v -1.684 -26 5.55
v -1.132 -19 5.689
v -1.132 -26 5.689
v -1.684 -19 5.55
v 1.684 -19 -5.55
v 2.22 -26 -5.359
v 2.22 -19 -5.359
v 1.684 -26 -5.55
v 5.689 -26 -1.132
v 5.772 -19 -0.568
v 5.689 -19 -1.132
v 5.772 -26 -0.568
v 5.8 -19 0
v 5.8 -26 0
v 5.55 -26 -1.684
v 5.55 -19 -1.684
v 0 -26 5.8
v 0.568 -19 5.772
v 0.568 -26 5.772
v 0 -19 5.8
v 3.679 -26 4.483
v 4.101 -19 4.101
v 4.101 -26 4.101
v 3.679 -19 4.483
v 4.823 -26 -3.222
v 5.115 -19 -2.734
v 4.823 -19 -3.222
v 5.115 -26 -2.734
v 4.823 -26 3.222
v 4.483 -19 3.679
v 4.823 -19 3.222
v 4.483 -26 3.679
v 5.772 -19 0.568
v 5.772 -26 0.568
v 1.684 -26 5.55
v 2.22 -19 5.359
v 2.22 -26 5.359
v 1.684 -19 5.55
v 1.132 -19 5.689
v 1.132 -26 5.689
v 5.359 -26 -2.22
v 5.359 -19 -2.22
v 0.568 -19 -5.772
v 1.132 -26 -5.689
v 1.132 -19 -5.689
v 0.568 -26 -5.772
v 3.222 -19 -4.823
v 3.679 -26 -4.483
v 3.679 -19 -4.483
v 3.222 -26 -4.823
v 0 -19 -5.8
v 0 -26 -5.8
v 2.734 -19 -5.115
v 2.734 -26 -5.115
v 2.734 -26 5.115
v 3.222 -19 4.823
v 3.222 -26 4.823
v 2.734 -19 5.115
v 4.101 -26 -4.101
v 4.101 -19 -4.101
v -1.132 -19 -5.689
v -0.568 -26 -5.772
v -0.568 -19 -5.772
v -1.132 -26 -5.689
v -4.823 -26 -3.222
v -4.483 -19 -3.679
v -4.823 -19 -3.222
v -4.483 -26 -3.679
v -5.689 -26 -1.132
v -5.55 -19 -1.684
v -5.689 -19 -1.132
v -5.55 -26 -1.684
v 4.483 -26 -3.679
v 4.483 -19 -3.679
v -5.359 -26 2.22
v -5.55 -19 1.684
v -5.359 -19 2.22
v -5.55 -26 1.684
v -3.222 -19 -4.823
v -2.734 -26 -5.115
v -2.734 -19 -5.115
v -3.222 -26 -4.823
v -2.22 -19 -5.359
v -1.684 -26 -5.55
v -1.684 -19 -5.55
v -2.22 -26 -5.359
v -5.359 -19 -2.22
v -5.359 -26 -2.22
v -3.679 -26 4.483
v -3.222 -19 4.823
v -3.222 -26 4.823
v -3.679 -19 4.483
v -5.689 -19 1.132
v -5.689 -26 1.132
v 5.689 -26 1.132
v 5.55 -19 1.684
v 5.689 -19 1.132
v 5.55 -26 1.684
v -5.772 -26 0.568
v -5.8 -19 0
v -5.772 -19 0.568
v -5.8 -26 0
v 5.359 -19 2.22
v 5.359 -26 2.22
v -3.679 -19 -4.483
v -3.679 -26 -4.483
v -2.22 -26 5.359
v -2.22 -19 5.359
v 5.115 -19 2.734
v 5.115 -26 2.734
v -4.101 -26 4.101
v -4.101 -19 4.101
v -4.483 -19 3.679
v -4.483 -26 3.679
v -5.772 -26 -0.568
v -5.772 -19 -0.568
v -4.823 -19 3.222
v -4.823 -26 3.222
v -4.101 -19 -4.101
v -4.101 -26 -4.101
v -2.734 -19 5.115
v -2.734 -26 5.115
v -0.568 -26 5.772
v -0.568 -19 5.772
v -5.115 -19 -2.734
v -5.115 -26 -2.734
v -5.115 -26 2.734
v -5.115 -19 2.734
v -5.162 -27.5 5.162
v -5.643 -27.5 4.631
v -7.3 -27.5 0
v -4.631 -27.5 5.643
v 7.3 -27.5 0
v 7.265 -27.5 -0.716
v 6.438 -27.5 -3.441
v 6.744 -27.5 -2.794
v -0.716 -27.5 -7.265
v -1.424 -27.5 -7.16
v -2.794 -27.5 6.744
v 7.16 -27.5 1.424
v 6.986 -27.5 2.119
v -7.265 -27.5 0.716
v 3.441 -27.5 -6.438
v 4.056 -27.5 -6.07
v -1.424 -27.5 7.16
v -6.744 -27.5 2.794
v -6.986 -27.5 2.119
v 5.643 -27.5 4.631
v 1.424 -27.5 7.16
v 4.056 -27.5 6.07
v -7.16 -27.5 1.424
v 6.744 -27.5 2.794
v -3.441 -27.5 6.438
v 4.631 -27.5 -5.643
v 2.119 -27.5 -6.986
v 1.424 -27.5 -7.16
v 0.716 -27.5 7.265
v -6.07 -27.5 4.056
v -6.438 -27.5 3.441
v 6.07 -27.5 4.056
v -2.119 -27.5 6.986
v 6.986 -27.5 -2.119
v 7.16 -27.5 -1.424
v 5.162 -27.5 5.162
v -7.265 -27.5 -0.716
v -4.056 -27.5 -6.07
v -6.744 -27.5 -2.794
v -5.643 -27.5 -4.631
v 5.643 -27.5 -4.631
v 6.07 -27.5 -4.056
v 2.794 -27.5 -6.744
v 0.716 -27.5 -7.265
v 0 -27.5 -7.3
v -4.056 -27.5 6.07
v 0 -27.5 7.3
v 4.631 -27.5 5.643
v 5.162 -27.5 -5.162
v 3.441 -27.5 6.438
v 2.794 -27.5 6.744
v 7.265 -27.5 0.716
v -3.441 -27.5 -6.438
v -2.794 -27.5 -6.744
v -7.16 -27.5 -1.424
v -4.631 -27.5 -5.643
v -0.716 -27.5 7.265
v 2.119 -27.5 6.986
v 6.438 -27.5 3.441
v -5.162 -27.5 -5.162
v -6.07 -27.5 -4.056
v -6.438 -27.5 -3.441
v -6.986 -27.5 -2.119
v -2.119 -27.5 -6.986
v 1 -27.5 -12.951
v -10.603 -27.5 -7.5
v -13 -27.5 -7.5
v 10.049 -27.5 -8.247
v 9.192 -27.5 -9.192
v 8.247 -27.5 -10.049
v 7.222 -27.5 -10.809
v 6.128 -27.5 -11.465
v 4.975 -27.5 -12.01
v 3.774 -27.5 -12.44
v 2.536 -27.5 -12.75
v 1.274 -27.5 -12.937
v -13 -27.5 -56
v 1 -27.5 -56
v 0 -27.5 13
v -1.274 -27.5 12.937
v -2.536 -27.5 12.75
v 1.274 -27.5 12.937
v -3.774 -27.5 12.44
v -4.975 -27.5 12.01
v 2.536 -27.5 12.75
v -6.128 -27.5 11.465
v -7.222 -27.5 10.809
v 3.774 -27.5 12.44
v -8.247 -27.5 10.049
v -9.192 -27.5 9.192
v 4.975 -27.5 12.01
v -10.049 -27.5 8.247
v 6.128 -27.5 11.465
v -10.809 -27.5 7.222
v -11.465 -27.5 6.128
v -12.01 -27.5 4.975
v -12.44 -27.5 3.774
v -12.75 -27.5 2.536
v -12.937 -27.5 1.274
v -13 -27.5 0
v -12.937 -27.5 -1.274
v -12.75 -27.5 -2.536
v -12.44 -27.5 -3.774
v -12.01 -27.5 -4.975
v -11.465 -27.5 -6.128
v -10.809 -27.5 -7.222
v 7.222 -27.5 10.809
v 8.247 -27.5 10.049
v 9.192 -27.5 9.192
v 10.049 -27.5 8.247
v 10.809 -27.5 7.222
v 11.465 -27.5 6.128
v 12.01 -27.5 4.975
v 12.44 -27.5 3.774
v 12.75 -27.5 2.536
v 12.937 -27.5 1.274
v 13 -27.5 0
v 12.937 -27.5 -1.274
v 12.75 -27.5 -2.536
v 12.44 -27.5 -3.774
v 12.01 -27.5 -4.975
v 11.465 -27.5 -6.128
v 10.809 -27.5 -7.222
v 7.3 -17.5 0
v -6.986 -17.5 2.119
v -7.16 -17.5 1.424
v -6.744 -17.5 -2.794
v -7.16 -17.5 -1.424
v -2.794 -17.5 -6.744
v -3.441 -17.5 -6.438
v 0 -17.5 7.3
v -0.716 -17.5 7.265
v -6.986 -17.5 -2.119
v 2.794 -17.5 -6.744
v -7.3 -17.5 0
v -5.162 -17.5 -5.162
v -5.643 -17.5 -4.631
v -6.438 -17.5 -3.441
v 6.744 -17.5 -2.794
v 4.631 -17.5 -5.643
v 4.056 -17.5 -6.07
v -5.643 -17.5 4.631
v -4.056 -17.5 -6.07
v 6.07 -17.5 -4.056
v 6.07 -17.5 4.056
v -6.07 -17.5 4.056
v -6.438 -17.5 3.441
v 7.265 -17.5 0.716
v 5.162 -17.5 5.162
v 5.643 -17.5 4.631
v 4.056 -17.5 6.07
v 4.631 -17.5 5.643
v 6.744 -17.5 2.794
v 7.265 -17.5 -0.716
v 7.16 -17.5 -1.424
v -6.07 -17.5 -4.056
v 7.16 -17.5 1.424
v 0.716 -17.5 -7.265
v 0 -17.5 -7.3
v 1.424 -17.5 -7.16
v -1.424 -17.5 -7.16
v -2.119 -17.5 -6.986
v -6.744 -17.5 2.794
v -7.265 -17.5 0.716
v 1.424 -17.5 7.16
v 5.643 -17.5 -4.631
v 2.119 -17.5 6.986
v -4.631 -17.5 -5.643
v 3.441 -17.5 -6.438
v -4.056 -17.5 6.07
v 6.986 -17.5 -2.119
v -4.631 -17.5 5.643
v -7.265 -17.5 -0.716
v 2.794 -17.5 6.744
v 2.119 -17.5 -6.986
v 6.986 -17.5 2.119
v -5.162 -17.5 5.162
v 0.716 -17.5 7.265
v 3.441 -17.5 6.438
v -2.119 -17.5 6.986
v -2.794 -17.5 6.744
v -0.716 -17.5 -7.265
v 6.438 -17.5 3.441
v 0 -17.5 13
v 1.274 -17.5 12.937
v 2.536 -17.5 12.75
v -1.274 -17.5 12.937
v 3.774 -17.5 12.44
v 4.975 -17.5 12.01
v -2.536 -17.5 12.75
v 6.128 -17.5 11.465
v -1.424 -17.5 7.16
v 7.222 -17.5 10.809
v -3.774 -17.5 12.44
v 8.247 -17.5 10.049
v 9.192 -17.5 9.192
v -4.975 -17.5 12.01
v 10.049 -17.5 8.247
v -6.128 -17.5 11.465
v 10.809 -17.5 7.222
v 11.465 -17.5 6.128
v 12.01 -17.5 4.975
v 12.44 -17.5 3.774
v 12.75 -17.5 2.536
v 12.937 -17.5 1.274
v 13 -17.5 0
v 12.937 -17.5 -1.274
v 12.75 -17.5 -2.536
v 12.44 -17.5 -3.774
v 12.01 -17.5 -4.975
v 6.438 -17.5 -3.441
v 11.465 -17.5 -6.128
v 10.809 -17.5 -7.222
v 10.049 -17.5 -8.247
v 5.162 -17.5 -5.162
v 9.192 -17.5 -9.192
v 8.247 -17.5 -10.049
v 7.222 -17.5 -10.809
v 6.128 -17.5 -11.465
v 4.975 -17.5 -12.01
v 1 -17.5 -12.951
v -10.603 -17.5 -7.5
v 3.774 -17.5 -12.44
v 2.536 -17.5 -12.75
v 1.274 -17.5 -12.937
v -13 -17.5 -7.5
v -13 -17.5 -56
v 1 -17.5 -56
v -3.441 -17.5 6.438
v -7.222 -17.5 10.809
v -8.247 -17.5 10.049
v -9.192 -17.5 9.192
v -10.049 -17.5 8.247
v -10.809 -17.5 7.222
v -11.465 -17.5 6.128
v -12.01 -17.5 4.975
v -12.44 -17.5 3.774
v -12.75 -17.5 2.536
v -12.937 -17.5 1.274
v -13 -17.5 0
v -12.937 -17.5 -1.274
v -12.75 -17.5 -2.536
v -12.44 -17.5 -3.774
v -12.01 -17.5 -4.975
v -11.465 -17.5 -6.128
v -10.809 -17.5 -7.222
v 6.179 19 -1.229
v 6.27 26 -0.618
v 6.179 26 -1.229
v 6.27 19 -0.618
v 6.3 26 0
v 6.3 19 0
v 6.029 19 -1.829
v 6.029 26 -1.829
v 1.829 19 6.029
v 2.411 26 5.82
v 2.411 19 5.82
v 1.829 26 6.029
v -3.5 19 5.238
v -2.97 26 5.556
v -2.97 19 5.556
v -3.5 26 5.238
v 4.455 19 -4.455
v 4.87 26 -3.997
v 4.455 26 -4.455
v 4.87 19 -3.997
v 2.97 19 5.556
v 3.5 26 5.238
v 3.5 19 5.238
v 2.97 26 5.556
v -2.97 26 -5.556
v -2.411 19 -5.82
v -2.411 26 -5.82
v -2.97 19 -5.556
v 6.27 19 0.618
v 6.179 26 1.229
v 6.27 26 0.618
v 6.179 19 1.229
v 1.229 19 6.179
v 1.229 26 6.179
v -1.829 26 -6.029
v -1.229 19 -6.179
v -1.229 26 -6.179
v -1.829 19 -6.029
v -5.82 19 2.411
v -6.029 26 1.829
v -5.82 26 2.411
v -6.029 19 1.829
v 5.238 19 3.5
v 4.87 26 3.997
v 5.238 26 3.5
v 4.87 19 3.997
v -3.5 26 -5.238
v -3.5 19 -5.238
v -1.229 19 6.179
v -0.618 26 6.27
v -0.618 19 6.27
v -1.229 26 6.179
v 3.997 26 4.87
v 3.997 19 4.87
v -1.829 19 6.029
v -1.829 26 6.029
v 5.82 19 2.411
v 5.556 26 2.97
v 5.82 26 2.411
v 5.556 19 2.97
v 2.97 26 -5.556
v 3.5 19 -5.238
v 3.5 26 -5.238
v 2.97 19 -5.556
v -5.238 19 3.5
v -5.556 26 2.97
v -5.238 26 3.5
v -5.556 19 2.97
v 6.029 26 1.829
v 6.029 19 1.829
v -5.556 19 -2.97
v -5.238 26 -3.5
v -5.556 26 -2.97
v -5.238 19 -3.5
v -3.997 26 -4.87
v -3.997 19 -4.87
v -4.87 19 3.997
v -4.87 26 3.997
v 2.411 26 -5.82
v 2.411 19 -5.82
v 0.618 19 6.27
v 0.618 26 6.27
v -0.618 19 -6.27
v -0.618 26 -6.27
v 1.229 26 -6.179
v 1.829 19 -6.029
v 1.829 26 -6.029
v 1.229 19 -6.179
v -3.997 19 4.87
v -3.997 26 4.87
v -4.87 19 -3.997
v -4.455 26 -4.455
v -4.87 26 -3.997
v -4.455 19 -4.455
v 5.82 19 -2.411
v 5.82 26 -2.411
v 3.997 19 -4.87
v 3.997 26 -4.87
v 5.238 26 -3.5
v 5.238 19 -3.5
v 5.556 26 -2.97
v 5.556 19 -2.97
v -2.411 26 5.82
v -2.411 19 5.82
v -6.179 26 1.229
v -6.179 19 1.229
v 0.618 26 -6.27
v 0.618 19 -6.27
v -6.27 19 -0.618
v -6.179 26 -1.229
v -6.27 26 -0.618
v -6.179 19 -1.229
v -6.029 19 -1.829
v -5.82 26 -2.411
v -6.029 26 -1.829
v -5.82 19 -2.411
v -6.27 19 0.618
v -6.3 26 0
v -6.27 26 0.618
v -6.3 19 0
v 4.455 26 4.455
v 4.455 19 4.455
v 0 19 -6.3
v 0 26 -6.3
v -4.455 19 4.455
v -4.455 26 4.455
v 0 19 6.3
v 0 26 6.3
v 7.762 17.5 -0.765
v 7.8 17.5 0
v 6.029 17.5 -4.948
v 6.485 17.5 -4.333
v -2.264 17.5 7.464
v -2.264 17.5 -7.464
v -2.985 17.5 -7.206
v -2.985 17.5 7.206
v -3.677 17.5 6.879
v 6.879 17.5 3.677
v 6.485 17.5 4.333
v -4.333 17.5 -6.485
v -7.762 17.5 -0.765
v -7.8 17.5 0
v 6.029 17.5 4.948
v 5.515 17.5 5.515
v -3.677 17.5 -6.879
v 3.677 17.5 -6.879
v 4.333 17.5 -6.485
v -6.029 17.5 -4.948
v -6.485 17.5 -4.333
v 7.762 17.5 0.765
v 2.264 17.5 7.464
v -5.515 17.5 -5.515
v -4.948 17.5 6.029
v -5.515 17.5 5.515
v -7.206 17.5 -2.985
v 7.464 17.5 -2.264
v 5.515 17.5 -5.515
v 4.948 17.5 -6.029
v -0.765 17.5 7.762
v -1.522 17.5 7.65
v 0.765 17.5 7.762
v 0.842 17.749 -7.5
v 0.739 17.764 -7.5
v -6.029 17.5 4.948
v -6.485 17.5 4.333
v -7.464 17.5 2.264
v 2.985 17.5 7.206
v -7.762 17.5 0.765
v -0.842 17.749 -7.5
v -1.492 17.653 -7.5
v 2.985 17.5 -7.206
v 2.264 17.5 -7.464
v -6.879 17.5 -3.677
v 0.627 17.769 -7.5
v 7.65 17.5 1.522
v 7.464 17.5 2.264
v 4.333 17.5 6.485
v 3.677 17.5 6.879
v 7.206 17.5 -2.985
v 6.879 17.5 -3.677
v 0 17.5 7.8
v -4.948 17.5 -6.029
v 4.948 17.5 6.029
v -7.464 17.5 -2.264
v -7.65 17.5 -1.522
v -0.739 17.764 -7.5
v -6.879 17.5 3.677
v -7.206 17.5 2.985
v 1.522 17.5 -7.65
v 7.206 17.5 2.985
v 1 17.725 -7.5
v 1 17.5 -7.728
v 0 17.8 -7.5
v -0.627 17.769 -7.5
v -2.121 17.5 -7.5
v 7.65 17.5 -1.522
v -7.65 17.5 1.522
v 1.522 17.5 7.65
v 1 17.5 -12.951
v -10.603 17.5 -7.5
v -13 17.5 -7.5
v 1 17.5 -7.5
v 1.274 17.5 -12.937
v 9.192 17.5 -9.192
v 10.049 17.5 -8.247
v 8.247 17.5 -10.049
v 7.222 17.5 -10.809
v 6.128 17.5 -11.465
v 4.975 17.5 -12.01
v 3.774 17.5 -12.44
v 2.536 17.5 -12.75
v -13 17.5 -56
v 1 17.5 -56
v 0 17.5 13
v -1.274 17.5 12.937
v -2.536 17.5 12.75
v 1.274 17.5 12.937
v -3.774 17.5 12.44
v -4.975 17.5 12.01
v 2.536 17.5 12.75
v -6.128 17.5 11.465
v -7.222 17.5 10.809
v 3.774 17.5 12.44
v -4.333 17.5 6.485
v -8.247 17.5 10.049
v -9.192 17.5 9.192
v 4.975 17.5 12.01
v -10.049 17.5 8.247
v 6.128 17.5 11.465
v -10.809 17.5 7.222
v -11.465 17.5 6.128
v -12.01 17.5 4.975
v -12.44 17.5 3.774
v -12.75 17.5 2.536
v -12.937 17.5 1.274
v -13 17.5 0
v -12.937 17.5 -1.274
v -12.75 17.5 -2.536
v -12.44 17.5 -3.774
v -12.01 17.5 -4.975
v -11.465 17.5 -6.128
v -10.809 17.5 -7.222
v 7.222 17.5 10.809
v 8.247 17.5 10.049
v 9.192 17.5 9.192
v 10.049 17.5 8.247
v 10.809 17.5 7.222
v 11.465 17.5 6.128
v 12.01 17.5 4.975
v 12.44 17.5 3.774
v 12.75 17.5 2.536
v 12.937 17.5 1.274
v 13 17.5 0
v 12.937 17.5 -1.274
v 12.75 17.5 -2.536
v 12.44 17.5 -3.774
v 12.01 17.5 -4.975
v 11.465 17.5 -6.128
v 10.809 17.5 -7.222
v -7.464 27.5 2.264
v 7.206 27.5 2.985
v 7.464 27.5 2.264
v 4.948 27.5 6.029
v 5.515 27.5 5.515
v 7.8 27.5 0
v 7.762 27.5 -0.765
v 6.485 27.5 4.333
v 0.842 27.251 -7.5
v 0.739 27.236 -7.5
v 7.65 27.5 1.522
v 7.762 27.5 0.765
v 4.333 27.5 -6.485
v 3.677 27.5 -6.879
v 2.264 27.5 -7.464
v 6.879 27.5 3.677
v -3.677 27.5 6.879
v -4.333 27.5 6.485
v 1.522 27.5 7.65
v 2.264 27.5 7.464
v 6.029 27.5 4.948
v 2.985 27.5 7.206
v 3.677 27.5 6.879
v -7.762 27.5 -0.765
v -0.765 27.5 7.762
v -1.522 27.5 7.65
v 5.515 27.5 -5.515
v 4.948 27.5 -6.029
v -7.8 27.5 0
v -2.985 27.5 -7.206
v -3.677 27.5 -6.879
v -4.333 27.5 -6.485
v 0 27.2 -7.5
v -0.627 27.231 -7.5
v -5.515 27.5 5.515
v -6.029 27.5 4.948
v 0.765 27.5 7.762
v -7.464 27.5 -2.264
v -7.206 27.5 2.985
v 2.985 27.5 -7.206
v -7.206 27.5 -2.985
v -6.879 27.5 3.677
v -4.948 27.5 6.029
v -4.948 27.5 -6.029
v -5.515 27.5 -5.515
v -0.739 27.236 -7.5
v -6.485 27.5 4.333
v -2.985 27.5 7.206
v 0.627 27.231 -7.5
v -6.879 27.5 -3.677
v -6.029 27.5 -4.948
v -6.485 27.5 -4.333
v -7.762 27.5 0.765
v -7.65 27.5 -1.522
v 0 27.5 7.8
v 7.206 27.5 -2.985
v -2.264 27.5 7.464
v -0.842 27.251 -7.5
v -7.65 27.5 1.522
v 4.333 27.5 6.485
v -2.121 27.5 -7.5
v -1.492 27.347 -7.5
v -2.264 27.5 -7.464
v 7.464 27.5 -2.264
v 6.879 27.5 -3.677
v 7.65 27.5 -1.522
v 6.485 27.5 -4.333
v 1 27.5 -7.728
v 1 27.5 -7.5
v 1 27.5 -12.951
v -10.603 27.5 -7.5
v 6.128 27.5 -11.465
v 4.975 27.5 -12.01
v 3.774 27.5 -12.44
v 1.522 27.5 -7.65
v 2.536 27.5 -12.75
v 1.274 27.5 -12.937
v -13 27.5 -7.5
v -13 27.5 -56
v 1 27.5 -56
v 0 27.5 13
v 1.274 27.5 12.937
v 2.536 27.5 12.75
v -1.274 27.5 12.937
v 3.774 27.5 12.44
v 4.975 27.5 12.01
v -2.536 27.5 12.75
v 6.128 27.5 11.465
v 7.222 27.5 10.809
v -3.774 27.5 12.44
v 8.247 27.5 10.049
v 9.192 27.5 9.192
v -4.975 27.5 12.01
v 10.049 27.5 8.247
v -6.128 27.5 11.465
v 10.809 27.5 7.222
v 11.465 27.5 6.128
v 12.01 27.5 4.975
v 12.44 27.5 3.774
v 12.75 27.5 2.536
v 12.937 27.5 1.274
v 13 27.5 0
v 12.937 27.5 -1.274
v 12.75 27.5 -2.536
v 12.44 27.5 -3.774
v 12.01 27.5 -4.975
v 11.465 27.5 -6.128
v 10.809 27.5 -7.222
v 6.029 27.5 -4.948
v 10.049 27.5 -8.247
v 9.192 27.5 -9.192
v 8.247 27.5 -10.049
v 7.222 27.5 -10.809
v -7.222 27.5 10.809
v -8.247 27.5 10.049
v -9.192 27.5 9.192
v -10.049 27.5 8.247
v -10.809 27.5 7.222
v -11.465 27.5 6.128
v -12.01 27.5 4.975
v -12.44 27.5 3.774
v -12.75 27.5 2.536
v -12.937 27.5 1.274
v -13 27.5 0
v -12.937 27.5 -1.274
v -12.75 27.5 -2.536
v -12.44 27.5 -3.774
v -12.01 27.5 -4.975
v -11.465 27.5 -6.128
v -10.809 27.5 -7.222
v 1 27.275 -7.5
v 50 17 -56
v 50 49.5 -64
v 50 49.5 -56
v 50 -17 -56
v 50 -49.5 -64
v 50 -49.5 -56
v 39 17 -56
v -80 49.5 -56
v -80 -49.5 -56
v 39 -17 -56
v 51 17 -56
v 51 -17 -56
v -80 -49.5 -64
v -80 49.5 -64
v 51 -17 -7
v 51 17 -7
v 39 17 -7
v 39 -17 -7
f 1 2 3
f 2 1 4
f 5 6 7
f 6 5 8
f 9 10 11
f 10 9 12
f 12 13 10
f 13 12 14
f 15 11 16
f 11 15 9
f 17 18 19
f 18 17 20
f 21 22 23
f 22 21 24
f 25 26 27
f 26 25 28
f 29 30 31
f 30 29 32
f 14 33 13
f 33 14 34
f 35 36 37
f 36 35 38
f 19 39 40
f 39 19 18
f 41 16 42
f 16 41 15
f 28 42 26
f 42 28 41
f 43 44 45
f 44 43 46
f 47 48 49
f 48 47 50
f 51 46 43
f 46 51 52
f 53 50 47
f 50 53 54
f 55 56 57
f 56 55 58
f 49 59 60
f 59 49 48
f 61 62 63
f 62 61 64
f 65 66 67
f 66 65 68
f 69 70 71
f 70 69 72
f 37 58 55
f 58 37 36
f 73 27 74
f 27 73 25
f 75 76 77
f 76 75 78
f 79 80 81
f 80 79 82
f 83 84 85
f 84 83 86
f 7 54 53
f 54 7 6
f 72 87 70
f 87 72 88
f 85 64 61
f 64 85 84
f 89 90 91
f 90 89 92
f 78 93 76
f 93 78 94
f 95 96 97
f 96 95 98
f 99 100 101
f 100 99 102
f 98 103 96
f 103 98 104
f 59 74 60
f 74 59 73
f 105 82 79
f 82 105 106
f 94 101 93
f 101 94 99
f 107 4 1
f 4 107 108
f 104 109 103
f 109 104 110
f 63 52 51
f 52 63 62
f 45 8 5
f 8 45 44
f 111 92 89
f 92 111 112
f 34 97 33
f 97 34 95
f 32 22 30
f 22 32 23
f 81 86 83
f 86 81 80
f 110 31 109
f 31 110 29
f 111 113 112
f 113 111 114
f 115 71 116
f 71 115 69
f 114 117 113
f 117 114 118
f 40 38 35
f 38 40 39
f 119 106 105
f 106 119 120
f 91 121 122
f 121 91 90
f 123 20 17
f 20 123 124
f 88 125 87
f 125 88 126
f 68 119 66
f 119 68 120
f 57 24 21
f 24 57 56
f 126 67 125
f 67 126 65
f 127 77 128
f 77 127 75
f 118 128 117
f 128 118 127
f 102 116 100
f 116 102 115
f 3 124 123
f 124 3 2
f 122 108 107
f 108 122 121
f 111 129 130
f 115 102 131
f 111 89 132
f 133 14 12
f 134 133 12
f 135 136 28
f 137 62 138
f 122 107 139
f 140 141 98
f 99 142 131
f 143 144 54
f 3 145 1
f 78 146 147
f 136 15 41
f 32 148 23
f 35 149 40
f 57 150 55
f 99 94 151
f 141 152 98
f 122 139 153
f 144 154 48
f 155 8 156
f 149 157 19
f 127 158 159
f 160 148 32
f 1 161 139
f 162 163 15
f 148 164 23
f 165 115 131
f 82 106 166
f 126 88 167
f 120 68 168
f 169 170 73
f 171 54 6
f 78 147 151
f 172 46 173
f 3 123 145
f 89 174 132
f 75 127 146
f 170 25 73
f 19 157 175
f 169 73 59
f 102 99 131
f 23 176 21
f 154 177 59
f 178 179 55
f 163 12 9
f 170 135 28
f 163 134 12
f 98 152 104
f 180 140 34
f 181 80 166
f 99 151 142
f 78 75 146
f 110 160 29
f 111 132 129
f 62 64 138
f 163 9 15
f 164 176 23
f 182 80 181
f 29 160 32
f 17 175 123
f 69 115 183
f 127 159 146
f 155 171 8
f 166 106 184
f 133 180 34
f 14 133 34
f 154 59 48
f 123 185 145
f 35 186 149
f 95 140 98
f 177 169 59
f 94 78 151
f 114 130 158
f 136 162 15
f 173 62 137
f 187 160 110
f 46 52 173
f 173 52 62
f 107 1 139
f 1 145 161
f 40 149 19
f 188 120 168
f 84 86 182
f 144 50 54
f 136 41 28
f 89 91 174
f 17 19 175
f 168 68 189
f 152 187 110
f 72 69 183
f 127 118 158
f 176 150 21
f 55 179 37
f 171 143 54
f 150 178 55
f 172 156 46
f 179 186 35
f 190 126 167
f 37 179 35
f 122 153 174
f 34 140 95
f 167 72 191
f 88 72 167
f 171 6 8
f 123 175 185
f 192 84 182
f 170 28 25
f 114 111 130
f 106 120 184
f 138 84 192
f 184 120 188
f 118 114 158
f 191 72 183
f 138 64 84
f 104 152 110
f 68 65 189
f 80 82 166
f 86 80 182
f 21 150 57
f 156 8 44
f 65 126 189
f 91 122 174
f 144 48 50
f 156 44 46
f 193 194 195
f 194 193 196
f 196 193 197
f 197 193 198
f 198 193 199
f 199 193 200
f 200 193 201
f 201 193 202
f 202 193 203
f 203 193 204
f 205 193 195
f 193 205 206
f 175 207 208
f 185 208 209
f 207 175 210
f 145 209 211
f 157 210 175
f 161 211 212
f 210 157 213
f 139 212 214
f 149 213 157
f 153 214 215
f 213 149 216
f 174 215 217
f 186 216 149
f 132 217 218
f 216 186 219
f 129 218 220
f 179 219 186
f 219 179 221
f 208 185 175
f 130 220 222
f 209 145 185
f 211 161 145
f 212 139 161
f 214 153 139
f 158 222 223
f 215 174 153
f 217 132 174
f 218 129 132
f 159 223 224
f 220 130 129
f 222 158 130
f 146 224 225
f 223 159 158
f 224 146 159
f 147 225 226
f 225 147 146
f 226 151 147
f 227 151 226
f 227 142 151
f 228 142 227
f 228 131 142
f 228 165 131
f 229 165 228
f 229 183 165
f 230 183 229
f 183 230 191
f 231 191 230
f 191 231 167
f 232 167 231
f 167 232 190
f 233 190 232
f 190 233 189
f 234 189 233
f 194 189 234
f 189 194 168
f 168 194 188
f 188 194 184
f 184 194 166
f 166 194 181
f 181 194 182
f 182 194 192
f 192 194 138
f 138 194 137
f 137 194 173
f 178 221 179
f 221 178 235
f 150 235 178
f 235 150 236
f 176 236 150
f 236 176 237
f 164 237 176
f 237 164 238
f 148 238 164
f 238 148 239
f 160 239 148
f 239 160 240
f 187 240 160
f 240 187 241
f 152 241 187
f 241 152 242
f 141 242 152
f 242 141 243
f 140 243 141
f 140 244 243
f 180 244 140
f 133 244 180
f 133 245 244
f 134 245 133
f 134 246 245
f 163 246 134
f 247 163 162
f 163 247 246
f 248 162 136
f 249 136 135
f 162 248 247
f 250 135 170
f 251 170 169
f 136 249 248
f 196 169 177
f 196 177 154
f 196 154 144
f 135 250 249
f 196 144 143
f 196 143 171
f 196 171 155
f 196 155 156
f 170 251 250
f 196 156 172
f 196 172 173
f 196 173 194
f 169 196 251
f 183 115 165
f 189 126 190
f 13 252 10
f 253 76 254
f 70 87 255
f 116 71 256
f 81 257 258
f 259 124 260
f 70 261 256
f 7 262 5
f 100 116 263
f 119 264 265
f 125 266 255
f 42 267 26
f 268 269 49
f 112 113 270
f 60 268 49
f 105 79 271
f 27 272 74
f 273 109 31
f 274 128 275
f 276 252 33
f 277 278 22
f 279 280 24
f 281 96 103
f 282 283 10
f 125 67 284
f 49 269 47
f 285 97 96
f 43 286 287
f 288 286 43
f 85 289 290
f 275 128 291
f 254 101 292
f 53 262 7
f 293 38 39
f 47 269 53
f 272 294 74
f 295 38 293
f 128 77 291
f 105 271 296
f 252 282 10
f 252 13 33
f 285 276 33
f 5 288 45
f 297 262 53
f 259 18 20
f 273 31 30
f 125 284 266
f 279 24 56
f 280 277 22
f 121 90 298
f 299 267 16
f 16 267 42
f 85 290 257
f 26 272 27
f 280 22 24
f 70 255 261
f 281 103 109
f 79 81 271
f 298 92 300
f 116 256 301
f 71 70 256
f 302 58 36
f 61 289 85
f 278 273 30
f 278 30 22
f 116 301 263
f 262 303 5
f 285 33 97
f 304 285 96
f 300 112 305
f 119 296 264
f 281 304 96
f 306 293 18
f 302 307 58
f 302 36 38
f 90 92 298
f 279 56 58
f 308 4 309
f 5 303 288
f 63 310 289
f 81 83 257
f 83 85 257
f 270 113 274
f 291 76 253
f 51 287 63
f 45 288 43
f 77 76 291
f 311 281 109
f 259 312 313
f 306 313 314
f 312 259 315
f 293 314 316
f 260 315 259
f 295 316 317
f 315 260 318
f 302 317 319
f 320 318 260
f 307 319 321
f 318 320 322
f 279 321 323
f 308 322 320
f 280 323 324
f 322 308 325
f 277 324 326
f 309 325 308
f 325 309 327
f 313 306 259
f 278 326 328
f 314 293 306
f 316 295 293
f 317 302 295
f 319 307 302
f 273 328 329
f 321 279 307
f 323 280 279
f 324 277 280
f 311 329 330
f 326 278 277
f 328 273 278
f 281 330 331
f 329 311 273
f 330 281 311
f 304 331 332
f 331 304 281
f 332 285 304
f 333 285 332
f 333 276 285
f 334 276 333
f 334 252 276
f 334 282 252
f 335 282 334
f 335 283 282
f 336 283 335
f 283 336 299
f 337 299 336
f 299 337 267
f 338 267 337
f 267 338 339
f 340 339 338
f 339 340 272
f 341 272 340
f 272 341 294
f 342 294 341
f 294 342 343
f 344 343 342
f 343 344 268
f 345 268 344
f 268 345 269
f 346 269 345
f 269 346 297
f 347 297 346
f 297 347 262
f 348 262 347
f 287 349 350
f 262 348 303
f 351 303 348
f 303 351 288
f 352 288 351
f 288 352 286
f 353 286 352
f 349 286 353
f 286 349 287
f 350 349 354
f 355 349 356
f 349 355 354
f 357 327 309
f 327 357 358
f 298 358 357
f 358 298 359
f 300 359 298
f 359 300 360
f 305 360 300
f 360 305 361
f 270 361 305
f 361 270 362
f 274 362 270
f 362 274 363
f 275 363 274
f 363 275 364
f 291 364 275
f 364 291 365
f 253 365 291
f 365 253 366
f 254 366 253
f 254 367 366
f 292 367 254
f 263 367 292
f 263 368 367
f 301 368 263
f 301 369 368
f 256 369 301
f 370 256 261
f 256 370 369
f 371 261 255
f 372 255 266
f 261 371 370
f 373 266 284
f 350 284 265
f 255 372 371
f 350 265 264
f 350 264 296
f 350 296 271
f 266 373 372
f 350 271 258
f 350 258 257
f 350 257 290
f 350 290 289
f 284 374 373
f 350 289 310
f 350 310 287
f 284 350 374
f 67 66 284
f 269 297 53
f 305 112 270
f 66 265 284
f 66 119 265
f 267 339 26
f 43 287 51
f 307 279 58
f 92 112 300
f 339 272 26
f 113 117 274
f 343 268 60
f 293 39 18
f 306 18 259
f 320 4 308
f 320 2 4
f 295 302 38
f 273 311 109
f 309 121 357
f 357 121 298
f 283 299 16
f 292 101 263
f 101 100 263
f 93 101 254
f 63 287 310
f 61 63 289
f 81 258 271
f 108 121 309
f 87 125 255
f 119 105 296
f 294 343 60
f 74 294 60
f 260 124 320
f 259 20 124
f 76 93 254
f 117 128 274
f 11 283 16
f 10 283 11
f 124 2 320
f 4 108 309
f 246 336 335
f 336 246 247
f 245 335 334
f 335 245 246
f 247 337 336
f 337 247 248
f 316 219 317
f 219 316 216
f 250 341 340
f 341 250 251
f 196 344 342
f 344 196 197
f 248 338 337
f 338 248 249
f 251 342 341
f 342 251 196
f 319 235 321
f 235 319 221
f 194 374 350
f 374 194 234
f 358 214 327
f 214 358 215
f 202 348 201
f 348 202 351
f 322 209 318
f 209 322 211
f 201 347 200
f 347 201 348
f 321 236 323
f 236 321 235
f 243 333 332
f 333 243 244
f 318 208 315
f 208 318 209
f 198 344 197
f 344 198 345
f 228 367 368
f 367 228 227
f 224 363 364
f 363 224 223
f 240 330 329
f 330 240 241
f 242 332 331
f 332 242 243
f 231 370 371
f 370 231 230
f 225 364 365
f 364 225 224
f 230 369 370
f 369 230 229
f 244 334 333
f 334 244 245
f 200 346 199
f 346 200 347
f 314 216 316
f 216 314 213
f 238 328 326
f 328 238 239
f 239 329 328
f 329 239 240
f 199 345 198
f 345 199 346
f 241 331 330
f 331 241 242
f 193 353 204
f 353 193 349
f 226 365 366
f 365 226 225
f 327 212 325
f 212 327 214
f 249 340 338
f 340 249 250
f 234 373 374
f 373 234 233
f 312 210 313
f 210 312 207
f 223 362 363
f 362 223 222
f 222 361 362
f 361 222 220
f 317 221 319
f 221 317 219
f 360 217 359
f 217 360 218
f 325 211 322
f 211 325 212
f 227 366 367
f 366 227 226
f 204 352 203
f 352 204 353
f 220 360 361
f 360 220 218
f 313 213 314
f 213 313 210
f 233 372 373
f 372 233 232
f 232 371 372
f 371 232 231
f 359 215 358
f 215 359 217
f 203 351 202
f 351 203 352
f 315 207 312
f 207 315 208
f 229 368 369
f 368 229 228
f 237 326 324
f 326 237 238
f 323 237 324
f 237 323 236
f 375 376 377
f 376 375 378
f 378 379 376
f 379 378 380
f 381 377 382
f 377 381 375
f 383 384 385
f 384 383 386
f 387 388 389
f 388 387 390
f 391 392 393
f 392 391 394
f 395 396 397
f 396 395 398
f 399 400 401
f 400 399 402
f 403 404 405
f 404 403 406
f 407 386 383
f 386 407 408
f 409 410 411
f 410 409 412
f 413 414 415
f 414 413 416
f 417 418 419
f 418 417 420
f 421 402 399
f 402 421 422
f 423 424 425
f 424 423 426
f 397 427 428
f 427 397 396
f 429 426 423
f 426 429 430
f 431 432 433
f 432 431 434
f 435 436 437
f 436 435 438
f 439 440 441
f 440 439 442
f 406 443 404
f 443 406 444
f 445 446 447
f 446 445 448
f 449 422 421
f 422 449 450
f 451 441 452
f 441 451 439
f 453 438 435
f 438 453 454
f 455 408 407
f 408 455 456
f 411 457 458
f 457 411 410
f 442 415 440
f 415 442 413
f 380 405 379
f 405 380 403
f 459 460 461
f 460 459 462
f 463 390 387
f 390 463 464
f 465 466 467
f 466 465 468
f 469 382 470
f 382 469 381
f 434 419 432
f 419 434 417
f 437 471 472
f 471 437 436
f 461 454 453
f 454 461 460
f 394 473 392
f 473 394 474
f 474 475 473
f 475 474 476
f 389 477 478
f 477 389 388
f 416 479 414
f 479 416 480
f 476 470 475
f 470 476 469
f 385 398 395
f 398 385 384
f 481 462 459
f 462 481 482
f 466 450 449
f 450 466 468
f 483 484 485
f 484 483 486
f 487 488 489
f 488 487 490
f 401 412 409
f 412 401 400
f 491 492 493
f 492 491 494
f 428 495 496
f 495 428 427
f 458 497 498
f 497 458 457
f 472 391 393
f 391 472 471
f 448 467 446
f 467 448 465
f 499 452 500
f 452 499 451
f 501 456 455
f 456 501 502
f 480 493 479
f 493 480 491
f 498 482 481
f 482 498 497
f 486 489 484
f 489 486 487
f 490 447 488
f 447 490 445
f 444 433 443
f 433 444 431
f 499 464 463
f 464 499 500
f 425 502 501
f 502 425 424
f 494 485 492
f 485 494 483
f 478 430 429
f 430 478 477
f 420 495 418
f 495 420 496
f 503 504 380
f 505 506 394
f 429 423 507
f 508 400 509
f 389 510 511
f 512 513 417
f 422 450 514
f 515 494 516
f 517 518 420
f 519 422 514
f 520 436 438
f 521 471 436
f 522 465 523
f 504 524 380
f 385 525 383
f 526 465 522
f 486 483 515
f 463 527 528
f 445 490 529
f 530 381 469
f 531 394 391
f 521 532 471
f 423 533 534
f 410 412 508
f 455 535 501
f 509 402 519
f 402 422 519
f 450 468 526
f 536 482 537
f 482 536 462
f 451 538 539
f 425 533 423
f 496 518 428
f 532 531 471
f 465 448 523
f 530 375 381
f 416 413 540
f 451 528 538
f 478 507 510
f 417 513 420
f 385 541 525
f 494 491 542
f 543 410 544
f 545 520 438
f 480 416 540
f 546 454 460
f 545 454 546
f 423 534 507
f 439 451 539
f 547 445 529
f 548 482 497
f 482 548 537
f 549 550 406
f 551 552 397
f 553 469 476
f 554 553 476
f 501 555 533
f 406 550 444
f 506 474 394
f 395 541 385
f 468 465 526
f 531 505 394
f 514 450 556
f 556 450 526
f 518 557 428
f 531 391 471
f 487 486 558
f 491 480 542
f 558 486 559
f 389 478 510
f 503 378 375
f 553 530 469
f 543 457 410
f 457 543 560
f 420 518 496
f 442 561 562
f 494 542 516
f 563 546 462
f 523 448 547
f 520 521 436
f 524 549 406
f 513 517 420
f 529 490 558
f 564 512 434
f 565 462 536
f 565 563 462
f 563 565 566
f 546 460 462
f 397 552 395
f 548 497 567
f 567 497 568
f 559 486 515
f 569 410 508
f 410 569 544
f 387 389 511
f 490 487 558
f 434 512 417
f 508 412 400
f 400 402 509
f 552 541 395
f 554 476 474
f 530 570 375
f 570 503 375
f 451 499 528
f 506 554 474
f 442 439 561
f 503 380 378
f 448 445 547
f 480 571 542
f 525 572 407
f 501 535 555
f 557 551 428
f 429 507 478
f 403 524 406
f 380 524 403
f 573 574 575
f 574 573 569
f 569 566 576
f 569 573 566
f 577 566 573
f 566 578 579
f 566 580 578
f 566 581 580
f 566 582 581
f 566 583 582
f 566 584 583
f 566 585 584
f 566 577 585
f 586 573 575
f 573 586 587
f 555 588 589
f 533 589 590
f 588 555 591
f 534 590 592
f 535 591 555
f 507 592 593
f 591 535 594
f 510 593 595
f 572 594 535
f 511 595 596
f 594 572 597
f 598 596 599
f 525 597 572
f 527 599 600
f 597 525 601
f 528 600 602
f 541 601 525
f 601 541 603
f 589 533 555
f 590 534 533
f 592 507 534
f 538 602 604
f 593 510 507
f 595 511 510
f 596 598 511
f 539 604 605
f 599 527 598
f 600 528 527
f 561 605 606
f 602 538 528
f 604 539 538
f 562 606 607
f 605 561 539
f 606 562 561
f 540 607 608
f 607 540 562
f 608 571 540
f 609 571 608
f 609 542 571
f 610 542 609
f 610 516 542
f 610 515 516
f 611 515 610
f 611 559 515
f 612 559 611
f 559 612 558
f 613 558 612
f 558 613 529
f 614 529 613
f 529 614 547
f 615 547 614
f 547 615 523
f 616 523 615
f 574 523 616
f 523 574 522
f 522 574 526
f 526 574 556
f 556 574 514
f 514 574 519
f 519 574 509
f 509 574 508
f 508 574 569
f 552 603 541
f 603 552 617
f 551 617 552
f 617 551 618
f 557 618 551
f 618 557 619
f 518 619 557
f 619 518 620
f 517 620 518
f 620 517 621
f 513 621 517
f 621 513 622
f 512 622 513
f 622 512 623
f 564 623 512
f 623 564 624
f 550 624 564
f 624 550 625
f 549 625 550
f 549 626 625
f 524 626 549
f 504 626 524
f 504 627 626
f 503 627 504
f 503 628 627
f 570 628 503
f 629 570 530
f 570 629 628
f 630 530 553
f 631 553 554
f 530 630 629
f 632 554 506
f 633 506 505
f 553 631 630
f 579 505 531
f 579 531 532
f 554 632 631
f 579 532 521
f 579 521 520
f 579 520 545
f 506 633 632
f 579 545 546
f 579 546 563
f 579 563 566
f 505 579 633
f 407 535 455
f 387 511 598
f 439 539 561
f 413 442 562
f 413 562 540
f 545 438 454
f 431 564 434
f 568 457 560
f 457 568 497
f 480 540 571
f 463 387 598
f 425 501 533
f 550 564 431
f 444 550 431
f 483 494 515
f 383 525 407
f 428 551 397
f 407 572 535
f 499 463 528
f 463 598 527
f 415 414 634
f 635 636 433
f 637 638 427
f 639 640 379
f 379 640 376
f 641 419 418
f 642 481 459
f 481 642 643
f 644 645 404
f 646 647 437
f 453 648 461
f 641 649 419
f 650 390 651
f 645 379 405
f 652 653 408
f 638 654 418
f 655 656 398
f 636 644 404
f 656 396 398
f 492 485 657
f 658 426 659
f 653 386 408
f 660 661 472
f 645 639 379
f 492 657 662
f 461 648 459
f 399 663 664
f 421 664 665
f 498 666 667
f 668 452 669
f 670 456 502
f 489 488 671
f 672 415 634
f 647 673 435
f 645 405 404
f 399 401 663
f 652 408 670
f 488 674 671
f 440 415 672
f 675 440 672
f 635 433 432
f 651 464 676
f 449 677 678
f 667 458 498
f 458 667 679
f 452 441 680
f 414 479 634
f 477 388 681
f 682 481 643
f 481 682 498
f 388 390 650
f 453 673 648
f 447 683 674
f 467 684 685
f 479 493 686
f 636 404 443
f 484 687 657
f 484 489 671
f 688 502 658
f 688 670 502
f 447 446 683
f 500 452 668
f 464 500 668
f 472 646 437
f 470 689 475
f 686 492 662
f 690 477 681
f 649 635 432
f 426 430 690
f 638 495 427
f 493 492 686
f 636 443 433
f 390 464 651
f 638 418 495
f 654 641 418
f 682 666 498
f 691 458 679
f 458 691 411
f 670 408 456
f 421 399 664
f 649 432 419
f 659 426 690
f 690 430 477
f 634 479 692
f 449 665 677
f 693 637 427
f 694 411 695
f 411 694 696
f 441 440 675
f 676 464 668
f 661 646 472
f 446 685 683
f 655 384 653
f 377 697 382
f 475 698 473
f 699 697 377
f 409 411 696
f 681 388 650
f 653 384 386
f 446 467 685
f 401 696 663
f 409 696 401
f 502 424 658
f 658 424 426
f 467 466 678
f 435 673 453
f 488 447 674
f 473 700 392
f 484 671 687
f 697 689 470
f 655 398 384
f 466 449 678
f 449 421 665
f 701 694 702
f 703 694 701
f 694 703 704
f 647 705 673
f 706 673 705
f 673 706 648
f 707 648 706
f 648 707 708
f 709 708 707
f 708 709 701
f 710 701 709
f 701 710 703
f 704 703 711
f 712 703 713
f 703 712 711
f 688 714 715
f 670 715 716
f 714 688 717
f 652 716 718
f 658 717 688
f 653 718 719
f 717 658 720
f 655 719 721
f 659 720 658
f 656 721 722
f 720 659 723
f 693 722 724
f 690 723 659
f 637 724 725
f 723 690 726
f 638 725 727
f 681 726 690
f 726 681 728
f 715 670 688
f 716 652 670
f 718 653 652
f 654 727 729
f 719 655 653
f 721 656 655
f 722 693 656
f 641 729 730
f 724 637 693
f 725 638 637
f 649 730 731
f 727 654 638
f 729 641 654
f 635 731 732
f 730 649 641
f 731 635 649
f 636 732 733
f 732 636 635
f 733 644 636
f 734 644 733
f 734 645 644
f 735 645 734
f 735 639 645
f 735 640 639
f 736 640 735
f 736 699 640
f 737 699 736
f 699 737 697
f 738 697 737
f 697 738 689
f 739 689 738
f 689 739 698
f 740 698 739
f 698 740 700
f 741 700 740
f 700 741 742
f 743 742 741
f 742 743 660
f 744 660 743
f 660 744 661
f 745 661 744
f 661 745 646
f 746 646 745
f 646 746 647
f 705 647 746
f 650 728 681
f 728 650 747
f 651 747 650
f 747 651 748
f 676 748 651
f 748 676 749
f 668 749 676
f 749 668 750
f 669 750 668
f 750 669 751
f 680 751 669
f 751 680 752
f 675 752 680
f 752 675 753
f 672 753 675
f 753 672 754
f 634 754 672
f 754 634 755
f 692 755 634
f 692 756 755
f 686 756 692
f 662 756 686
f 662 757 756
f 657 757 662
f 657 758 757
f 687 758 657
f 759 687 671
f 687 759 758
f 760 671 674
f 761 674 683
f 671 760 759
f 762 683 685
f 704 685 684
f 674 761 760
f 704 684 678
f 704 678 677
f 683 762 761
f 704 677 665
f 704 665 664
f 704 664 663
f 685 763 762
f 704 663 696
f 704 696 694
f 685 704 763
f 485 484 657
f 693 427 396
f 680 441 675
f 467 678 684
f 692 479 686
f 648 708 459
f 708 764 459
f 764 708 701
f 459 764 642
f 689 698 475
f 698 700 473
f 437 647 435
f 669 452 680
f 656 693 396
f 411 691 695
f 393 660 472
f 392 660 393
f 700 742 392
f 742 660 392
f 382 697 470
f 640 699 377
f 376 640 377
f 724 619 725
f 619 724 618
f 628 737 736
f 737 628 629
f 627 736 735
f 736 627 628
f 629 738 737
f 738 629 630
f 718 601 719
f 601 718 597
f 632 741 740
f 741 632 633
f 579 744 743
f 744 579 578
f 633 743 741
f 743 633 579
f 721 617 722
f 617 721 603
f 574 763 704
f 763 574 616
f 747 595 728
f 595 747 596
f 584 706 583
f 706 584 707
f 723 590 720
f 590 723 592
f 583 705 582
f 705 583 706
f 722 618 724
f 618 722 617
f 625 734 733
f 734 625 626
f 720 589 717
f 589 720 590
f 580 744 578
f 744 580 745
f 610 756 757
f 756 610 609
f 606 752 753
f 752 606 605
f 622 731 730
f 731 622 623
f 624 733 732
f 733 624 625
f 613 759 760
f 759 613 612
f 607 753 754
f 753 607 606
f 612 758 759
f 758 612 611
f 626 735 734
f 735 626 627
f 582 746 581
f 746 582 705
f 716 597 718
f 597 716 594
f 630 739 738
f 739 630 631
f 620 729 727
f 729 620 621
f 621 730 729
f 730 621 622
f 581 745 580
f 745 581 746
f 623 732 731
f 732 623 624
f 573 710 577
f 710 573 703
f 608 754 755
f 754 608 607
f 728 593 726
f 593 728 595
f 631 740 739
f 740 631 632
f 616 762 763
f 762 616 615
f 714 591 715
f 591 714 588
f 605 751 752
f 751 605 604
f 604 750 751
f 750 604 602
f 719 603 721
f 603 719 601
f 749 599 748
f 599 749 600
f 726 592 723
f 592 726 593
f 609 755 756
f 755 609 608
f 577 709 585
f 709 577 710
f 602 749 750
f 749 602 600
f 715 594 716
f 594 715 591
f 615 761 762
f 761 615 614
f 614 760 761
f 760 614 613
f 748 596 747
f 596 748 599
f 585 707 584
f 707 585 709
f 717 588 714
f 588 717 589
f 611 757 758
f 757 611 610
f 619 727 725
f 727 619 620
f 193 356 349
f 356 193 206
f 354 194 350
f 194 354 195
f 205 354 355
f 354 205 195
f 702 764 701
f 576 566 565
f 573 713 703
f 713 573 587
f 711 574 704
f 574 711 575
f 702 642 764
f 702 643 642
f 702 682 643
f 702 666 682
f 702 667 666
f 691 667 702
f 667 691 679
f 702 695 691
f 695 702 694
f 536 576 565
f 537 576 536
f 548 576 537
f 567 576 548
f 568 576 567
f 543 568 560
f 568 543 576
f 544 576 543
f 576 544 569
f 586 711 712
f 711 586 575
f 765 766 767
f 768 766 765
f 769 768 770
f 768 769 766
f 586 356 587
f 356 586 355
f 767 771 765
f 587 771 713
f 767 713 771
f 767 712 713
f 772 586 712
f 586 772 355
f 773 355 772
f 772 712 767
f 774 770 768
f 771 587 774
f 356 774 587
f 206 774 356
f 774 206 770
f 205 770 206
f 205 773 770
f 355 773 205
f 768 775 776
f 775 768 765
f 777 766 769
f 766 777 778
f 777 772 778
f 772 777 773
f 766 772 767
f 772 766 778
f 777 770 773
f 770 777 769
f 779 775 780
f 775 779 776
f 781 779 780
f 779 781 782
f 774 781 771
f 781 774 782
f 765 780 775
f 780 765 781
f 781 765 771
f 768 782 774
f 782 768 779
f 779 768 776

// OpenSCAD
// Millimetres. Select "base", "flap", or "pin".
part = "base";
$fn = 64;

module box(center, size) {
    translate(center) cube(size, center=true);
}

module cylinder_y(y, length, r0, r1) {
    translate([0, y, 0]) rotate([-90, 0, 0])
        cylinder(h=length, r1=r0, r2=r1, center=true);
}

module eye(y, length, bore=5.8) {
    difference() {
        cylinder_y(y, length, 13, 13);
        union() {
            cylinder_y(y, length + 1, bore, bore);
            cylinder_y(y - length/2 + .75, 1.5, bore + 1.5, bore);
            cylinder_y(y + length/2 - .75, 1.5, bore, bore + 1.5);
        }
    }
}

module base() {
    box([-15,0,-60], [130,99,8]);
    for (y = [-22.5,22.5]) {
        eye(y,10,y > 0 ? 6.3 : 5.8);
        box([-6,y,-33.5], [14,10,52]);
    }
    box([45,0,-31.5], [12,34,49]);
}

module flap() {
    eye(0,26);
    box([59,0,-2], [80,60,10]);
    box([14,0,-2], [14,24,10]);
    box([64,54,4], [20,68,12]);
    box([64,90,24], [24,28,40]);
}

module pin() {
    cylinder_y(-2,61,5,5);
    cylinder_y(30.5,4,5,4.2);
    box([0,-41,7.5], [25,18,25]);
    box([0,-47,28], [25,24,28]);
}

if (part == "base") base();
if (part == "flap") flap();
if (part == "pin") pin();
